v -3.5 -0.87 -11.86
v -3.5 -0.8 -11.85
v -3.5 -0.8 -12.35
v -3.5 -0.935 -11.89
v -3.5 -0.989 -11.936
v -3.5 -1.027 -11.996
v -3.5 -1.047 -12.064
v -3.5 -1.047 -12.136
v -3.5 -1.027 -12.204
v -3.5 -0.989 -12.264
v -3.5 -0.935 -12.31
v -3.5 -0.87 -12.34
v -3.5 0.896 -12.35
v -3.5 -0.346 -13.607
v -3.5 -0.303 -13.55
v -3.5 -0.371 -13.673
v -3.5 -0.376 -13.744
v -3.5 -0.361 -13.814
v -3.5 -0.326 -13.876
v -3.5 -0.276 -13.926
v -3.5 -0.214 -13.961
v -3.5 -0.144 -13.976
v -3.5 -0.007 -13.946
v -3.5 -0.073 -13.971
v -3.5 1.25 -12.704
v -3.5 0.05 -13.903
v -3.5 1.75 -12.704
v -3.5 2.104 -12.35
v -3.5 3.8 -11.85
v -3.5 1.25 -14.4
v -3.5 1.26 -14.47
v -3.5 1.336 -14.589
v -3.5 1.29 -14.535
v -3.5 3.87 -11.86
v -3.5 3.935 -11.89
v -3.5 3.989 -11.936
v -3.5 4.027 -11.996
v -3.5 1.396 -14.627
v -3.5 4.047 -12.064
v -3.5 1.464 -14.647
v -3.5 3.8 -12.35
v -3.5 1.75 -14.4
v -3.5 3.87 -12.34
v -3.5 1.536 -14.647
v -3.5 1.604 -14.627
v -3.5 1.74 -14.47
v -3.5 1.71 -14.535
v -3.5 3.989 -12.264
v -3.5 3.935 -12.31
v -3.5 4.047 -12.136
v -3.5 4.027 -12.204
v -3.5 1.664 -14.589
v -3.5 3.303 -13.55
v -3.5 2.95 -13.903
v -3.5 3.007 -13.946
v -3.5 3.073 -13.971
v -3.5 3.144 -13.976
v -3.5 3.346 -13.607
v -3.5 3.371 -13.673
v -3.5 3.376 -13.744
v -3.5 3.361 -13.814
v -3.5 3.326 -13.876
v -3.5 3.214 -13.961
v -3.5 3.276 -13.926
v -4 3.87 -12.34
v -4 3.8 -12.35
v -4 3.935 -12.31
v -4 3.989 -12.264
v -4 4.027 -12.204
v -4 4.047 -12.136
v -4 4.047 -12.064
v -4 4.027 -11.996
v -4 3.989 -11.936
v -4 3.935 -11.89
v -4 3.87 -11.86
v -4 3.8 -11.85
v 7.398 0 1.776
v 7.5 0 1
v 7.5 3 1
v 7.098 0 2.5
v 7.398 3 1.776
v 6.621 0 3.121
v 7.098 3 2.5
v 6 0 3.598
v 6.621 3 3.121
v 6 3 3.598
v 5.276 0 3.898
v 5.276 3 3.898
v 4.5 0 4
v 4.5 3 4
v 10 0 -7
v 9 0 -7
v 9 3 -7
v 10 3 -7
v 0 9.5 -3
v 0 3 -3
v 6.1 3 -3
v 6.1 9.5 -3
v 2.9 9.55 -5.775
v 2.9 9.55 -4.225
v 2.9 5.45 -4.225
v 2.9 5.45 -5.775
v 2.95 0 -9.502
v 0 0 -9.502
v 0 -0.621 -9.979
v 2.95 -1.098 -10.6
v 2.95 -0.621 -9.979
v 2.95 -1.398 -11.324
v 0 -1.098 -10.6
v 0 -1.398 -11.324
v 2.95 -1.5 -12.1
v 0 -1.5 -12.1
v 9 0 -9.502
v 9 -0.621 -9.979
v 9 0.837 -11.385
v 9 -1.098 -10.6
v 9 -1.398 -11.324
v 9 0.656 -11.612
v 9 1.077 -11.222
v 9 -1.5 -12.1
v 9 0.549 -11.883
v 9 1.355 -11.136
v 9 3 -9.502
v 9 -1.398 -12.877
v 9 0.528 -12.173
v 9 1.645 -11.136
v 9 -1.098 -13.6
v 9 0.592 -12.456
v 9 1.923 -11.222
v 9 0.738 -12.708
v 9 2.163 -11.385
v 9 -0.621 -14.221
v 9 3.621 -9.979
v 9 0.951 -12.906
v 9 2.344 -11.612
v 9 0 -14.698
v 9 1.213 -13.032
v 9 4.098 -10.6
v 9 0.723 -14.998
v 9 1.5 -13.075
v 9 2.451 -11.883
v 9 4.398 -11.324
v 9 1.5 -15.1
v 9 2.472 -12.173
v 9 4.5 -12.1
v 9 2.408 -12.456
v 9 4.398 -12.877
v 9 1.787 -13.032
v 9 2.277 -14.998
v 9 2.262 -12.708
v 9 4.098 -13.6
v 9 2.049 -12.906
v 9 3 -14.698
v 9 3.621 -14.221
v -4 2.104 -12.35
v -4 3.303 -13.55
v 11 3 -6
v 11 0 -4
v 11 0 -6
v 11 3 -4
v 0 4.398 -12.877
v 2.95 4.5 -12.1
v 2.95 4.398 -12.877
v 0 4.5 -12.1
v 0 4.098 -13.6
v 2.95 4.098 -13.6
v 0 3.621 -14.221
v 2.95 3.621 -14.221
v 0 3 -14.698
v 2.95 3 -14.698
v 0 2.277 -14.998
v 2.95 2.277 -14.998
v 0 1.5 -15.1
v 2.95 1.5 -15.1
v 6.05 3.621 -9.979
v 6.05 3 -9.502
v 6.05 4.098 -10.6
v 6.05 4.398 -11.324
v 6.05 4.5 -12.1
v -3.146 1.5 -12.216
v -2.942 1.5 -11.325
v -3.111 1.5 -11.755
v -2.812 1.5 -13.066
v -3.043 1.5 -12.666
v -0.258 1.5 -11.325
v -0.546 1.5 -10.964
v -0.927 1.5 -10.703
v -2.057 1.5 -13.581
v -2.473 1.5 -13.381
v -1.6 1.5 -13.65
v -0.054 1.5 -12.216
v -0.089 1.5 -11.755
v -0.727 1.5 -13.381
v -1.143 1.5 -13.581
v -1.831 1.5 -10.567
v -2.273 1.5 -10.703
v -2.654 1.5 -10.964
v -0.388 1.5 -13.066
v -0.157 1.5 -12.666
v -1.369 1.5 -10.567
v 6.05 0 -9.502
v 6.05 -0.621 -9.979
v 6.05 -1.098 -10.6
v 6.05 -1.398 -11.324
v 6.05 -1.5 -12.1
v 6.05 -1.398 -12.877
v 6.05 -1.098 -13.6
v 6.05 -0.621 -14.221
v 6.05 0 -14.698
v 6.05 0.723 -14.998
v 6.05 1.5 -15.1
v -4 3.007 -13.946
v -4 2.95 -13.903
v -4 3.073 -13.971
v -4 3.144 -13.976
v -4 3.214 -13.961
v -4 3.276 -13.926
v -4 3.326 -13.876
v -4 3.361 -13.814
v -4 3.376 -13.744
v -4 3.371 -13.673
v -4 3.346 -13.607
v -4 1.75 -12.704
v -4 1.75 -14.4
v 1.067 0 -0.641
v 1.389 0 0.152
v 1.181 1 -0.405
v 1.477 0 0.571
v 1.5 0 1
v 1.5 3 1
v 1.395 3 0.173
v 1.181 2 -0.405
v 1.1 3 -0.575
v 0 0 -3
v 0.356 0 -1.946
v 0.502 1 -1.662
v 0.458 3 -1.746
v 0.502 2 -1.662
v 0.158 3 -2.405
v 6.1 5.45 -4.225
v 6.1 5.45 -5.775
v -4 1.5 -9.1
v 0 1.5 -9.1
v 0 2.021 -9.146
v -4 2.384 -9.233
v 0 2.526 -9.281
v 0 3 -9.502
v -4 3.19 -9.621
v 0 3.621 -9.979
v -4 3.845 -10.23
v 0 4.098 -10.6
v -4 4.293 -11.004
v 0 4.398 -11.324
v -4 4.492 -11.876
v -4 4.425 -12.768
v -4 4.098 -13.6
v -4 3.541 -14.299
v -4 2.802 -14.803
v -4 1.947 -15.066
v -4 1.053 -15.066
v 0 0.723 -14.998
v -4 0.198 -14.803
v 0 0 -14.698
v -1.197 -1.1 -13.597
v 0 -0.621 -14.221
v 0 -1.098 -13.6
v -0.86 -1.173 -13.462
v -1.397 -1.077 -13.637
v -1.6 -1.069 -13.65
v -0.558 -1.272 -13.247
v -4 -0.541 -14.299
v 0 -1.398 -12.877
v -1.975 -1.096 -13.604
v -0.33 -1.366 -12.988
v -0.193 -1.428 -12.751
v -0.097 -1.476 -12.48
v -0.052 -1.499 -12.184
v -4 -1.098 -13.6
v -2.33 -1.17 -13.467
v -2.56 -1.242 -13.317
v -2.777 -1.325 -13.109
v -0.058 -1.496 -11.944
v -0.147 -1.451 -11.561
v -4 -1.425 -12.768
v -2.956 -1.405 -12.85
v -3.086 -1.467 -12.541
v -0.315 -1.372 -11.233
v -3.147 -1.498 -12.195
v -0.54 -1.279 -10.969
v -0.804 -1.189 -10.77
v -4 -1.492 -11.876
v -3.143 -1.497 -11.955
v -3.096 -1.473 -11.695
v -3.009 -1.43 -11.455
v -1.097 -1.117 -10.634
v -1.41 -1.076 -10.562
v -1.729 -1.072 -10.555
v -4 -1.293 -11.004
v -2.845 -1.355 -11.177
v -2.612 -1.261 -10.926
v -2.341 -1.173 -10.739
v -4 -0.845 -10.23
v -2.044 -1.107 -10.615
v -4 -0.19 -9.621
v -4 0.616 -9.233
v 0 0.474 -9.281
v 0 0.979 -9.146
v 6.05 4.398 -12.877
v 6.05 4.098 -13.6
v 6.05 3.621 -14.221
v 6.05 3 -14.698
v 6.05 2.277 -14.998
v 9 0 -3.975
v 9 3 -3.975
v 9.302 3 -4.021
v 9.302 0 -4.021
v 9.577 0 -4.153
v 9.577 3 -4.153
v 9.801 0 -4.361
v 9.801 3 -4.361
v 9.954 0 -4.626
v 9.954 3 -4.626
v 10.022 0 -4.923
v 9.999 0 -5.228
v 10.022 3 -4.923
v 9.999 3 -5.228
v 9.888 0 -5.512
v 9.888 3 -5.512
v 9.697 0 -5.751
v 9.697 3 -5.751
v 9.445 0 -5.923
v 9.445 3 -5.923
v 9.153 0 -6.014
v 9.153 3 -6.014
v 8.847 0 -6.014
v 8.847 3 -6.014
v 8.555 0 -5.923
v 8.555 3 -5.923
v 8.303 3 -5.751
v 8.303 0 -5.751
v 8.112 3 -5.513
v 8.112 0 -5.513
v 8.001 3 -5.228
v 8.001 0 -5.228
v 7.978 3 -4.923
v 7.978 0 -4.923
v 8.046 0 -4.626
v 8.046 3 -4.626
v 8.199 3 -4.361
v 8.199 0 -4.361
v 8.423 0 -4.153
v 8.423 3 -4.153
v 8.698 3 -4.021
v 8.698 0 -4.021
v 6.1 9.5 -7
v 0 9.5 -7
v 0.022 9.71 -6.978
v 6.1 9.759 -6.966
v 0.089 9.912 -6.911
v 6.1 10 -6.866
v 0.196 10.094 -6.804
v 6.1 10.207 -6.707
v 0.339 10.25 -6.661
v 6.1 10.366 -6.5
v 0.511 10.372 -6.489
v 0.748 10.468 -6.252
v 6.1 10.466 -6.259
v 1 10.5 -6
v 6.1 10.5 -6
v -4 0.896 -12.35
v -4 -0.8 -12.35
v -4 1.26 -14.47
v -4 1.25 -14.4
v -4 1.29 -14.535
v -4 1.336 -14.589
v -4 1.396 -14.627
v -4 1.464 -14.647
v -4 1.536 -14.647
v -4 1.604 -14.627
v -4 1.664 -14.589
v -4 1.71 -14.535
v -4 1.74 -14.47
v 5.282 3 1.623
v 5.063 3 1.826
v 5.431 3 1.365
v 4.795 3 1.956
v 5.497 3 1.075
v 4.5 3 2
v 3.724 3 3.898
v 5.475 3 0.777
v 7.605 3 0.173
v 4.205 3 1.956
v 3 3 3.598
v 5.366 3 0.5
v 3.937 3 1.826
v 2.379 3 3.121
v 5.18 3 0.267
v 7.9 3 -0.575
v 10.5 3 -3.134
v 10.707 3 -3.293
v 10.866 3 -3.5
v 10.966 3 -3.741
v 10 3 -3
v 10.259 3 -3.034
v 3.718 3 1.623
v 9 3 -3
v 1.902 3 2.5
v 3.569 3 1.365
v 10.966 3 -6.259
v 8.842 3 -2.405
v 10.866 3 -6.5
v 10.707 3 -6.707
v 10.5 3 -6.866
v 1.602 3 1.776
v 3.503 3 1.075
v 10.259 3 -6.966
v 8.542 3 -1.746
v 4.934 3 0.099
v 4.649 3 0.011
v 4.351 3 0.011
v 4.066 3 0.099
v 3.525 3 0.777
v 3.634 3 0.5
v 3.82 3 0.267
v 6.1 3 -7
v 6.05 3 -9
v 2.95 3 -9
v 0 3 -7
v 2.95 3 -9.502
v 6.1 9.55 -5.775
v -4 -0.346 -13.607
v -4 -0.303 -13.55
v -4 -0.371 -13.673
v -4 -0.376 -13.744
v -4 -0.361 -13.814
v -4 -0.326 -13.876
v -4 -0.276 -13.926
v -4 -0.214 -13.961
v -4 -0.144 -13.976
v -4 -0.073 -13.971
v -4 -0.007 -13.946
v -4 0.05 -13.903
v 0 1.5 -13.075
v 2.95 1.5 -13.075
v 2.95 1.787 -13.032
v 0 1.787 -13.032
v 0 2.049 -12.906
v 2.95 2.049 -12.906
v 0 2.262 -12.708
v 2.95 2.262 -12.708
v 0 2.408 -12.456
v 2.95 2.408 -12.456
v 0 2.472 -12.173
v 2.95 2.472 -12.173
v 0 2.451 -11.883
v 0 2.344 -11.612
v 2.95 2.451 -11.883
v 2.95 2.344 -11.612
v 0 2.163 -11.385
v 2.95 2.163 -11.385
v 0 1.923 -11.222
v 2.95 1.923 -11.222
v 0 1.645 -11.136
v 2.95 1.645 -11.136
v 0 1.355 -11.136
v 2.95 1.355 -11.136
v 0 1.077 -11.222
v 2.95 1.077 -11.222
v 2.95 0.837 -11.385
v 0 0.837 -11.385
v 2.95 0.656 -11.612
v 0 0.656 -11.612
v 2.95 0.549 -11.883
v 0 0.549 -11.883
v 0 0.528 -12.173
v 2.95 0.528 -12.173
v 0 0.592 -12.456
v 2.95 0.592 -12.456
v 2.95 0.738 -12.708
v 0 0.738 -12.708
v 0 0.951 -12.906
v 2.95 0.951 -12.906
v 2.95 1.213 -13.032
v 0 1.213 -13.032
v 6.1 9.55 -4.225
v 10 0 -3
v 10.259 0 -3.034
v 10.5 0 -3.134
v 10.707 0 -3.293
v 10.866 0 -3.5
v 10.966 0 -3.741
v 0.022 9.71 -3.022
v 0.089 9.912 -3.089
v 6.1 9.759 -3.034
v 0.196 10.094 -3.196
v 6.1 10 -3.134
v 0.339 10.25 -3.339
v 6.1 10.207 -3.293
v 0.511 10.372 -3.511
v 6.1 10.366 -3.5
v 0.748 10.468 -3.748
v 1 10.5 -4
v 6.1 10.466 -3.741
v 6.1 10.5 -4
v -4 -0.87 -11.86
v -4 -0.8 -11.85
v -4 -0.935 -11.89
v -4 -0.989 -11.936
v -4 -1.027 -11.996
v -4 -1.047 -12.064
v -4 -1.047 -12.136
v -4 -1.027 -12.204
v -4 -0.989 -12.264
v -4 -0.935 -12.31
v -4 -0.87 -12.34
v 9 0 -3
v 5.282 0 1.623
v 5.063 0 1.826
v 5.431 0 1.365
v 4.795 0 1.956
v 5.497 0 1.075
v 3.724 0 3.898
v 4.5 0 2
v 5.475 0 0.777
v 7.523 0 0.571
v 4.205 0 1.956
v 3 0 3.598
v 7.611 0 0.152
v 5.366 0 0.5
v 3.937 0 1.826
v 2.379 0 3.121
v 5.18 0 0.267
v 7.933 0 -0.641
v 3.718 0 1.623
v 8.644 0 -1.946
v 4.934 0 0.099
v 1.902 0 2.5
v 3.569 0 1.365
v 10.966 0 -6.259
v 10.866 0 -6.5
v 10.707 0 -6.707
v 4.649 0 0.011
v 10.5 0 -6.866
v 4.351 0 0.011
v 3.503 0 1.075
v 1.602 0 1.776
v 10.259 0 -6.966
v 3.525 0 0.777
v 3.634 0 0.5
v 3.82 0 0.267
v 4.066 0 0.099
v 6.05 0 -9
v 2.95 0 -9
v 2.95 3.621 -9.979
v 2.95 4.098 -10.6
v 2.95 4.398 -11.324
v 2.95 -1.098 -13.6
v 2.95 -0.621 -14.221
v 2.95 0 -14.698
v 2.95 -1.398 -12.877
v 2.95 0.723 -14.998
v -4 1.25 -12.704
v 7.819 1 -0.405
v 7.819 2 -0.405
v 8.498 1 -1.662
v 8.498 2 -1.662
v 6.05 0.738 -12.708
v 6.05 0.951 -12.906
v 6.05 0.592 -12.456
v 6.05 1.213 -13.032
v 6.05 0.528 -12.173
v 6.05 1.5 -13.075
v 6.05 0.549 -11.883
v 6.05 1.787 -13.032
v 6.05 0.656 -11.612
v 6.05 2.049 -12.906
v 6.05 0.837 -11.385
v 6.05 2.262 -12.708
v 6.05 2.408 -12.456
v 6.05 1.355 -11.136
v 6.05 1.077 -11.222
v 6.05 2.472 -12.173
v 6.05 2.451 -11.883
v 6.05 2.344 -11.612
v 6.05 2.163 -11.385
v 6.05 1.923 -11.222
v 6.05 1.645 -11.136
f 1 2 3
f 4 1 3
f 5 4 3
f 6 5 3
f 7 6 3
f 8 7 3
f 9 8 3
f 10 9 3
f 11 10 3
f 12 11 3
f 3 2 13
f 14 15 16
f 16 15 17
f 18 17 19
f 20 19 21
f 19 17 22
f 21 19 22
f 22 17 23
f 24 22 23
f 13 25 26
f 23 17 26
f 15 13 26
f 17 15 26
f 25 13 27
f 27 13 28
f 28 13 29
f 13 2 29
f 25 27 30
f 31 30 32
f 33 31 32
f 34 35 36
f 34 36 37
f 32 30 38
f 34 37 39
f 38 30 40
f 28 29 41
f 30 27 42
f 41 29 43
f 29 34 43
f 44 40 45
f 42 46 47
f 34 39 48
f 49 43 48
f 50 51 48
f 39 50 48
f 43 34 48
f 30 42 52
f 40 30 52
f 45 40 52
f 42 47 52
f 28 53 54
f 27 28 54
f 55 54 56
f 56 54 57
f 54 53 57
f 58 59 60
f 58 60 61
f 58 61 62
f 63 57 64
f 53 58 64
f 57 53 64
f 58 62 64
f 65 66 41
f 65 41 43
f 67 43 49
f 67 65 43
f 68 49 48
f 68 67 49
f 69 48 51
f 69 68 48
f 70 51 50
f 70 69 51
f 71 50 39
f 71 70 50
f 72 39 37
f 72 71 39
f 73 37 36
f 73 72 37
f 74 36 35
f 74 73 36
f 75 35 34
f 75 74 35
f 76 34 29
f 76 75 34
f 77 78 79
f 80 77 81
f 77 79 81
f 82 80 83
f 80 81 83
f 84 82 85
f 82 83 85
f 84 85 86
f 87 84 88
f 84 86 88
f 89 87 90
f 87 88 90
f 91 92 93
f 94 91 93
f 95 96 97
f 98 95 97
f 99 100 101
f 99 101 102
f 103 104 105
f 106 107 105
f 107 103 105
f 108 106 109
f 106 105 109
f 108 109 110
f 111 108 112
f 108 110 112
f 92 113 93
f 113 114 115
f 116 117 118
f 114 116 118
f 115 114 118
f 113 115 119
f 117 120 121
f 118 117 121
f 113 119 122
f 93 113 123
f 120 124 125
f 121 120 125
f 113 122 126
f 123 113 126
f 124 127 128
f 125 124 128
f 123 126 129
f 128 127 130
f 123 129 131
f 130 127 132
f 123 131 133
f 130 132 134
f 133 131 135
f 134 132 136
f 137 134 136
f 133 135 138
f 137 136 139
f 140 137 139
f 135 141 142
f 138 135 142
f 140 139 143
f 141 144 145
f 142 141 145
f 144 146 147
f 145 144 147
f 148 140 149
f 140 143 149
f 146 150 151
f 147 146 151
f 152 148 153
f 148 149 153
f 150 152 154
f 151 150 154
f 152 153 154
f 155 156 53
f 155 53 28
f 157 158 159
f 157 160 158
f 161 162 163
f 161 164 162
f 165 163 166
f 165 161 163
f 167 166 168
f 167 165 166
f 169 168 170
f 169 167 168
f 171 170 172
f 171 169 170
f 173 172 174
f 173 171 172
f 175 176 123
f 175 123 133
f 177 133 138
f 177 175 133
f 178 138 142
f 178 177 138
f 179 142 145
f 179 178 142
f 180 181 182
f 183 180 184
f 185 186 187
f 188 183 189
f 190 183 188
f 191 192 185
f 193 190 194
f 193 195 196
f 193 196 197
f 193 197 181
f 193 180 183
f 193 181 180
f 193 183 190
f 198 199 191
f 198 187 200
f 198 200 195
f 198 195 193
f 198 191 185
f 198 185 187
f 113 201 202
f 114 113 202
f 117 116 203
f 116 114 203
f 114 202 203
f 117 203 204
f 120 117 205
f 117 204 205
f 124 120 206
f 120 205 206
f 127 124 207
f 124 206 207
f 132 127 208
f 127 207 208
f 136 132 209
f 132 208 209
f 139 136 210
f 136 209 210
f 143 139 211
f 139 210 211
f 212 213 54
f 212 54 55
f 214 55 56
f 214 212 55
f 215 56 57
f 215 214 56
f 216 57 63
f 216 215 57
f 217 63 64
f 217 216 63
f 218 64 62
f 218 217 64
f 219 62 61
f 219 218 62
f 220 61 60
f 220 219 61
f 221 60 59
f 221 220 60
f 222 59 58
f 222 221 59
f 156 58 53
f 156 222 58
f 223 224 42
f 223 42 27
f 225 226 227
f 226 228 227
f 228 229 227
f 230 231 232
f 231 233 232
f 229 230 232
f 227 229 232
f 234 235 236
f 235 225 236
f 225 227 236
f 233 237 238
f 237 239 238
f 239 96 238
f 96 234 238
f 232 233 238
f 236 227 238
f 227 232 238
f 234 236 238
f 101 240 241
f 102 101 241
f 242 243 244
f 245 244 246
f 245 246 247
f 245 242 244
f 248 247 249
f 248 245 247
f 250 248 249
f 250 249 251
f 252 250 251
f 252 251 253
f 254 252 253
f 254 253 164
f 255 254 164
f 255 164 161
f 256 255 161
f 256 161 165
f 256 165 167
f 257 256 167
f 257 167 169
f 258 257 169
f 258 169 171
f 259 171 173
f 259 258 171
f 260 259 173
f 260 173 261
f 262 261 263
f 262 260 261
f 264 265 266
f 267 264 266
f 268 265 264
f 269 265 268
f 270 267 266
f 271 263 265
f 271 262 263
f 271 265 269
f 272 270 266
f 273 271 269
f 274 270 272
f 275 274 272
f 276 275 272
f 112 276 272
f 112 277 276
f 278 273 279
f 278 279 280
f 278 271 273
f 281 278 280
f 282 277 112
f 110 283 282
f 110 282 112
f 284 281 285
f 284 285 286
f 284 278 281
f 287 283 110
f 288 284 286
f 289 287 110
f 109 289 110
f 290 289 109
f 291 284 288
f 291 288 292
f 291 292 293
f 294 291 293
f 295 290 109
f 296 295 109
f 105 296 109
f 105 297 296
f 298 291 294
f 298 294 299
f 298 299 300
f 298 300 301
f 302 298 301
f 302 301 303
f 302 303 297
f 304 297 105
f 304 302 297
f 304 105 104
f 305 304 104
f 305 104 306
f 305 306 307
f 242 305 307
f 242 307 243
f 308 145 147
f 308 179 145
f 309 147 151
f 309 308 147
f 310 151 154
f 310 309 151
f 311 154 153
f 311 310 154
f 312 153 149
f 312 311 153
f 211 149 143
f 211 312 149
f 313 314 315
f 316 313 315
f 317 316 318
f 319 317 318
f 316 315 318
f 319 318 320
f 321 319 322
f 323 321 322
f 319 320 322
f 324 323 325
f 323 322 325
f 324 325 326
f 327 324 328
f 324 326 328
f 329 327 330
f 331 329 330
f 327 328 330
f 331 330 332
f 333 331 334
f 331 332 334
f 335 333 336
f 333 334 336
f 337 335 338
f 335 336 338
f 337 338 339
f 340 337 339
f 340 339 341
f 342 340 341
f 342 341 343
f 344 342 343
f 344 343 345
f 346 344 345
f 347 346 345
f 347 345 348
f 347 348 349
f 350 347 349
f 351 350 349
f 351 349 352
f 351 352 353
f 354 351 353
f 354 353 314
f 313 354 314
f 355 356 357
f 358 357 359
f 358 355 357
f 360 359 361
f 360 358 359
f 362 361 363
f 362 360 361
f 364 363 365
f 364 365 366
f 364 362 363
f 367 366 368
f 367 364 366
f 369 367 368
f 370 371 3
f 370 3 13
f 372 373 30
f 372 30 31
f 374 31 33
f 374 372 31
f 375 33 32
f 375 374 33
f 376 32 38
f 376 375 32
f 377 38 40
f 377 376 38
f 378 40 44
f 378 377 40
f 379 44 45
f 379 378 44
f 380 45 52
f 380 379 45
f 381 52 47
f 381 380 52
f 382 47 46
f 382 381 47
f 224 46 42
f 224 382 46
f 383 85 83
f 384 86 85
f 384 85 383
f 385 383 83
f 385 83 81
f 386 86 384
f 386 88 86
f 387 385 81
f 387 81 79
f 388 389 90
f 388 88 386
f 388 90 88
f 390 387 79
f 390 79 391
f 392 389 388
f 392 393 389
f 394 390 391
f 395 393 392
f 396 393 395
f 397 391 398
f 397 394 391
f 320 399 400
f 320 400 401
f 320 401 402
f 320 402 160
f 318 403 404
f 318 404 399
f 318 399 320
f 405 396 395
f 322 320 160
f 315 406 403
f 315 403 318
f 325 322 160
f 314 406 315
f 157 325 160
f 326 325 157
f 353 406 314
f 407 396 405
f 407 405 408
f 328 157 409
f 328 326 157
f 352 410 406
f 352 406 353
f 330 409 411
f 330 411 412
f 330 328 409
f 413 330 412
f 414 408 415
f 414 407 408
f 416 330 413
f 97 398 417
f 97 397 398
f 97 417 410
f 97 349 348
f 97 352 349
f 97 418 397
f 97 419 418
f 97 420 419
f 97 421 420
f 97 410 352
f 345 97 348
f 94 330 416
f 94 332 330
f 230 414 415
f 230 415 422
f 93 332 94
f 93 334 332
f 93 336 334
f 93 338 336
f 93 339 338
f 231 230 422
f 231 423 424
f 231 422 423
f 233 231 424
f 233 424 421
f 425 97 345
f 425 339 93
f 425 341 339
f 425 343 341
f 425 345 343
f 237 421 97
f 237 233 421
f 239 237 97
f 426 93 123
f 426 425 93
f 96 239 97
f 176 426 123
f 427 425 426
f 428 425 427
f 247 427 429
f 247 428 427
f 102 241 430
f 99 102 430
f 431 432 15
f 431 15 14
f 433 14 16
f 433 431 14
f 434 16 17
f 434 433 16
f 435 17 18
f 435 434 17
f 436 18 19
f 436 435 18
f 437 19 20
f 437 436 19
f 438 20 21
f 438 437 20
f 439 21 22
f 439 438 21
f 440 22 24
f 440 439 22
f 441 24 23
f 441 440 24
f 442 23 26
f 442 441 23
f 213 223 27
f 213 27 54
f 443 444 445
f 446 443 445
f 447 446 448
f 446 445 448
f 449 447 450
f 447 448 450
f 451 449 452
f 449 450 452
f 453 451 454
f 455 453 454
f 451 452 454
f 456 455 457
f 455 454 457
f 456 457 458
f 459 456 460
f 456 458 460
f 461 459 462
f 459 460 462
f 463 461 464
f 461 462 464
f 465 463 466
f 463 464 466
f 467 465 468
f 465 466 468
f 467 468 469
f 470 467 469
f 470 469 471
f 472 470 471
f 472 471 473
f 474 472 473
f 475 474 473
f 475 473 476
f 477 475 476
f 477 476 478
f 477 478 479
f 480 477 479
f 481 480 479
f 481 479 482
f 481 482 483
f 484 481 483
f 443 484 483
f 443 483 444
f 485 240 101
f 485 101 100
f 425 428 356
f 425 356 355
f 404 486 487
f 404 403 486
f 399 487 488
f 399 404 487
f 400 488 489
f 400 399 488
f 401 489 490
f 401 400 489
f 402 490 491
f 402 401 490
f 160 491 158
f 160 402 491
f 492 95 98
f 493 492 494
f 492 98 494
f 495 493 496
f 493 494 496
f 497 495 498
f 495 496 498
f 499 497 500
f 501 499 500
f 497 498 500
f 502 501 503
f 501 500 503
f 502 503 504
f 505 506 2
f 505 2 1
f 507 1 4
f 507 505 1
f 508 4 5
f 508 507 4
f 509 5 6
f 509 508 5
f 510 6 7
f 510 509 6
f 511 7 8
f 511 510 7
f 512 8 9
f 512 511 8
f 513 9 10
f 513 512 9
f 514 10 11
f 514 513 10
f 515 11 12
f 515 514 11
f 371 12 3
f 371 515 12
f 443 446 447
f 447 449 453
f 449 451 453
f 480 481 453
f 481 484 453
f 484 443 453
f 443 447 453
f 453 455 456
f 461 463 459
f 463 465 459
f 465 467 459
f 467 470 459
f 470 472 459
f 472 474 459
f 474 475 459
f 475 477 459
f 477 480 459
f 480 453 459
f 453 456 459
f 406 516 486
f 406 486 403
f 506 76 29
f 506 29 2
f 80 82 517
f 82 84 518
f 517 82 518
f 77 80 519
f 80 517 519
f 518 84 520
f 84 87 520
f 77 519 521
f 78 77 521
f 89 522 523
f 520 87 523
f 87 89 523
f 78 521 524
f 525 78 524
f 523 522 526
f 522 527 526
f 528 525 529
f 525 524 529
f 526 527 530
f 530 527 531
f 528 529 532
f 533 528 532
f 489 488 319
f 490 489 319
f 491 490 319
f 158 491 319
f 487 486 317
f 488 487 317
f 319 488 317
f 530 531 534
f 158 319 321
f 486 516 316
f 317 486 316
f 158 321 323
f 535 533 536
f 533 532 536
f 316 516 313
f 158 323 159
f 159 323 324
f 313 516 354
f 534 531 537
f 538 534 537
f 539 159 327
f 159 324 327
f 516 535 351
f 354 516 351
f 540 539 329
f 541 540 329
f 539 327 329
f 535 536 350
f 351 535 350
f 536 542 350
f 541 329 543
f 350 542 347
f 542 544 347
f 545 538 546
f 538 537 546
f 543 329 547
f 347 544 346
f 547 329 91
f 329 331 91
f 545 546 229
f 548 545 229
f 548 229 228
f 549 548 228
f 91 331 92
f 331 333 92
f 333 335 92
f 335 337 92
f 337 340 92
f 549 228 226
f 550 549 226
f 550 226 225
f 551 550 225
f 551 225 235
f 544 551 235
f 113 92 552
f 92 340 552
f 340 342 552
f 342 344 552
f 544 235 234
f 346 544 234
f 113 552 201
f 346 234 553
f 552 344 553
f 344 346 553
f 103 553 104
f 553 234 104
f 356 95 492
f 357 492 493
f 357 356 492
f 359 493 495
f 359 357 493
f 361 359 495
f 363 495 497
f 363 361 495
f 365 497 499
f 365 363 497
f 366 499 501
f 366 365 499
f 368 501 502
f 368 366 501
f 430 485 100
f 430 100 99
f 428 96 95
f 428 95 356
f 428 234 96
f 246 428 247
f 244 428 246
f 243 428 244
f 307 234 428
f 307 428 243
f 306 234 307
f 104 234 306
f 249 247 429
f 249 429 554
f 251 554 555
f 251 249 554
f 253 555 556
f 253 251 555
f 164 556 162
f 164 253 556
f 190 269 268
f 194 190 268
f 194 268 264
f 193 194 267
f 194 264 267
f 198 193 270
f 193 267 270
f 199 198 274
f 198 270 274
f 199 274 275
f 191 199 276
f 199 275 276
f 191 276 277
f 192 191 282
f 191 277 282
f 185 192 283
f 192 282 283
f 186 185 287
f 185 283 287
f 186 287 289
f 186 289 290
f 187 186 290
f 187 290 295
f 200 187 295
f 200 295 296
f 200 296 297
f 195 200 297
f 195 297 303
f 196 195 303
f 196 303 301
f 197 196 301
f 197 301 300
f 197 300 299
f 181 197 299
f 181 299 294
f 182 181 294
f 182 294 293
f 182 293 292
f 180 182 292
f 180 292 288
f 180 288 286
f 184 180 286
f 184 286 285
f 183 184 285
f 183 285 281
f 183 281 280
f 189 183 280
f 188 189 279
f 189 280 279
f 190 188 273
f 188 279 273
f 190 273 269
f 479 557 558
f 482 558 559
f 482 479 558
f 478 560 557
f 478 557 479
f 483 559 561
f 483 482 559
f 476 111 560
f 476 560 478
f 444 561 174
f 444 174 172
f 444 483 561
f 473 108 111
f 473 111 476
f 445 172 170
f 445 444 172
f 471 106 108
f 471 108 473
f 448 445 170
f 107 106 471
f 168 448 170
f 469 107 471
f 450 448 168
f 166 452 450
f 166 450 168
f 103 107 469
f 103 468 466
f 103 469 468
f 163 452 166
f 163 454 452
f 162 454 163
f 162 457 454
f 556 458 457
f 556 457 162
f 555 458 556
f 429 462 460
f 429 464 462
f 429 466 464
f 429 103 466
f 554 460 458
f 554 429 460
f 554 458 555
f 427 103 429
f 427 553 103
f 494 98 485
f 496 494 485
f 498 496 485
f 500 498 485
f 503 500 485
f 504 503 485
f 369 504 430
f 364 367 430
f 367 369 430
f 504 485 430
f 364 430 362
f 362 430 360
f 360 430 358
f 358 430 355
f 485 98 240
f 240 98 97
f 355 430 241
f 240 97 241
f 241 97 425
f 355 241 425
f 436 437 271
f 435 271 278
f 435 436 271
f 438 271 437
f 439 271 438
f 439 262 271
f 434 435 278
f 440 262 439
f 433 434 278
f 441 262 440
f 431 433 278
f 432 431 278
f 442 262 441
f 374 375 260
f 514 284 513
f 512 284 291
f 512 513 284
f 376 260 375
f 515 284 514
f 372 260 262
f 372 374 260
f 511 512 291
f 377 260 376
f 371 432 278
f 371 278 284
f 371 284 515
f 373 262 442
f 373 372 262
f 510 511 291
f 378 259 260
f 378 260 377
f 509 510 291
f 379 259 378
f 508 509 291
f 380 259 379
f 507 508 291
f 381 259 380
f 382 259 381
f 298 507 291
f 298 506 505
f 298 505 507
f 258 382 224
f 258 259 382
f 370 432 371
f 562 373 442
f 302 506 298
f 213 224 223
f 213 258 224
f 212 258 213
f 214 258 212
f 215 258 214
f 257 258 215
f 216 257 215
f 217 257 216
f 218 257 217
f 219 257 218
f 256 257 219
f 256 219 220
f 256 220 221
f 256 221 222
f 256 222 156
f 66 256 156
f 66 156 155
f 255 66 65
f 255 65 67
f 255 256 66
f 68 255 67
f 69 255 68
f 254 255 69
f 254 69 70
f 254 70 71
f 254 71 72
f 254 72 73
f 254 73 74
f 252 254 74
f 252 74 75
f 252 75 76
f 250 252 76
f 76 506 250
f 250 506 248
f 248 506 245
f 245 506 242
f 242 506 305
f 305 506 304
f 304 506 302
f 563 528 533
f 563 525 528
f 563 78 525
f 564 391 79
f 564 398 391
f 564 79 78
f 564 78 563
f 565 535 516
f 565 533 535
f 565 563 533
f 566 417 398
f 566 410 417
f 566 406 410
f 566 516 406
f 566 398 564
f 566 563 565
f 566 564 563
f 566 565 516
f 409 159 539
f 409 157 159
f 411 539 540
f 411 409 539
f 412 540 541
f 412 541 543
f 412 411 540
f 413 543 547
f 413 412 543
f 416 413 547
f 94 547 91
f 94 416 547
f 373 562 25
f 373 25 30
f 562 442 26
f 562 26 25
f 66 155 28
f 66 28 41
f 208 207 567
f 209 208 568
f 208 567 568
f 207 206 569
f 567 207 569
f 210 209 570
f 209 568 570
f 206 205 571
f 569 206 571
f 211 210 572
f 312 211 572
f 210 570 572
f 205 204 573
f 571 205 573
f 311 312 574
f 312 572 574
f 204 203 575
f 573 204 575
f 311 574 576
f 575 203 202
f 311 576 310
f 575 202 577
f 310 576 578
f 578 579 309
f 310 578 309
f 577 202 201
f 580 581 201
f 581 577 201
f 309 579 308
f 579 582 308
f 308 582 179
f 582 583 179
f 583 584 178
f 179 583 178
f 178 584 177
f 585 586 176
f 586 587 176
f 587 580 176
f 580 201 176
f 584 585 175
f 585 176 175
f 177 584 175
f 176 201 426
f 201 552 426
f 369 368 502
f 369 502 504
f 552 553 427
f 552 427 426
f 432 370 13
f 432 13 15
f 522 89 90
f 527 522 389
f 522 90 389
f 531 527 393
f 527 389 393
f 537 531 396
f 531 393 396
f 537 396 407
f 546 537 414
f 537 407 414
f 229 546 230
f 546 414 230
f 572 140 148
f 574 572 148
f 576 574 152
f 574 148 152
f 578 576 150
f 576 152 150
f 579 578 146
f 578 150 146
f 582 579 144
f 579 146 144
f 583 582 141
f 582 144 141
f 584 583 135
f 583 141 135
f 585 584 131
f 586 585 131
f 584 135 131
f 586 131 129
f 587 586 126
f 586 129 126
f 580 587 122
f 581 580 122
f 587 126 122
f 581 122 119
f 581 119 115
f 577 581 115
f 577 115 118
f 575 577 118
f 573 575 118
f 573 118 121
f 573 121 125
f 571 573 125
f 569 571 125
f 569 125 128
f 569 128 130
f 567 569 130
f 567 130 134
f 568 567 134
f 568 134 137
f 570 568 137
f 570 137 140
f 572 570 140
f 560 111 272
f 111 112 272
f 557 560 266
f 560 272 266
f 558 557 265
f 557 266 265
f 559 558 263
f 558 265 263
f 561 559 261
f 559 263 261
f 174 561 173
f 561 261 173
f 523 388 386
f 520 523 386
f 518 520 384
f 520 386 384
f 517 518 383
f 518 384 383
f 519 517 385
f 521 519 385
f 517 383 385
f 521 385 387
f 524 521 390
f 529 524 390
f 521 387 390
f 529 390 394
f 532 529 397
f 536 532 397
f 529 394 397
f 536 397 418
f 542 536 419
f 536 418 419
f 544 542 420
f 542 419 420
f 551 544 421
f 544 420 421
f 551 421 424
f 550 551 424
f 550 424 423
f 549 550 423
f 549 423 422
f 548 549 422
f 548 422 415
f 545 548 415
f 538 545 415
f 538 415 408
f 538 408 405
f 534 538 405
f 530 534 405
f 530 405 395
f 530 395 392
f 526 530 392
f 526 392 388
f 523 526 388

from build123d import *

# Parameters (mm, degrees)
SKETCH1_W           = 9
SKETCH1_H           = 9
BOSS_EXTRUDE1_DEPTH = 3
SKETCH2_W           = 2.95
SKETCH2_H           = 6
BOSS_EXTRUDE2_DEPTH = 6.1
FILLET1_R           = 3
SKETCH3_R           = 0.975
CUT_EXTRUDE1_DEPTH  = 11.1
CUT_EXTRUDE3_DEPTH  = 21.1
BOSS_EXTRUDE3_START = 4
SKETCH5_R           = 3
BOSS_EXTRUDE3_DEPTH = 4
SKETCH8_R           = 1.55
CUT_EXTRUDE4_DEPTH  = 3
CUT_EXTRUDE5_DEPTH  = 0.5
SKETCH10_W          = 9
SKETCH10_H          = 3
BOSS_EXTRUDE4_DEPTH = 4
SKETCH11_R          = 1
CUT_EXTRUDE6_DEPTH  = 4
CUT_EXTRUDE7_DEPTH  = 4
SKETCH13_W          = 6.1
SKETCH13_H          = 4
BOSS_EXTRUDE7_DEPTH = 7.5
SKETCH16_W          = 1.55
SKETCH16_H          = 4.1
CUT_EXTRUDE9_DEPTH  = 3.2
SKETCH17_W          = 4
SKETCH17_H          = 3
BOSS_EXTRUDE8_DEPTH = 2
SKETCH19_R          = 1.025
CUT_EXTRUDE10_DEPTH = 4
FILLET2_R           = 1


with BuildPart() as part:
    # Sketch1 → Boss-Extrude1 (new body)
    with BuildSketch(Plane(origin=(0, 0, 0), x_dir=(1, 0, 0), z_dir=(0, 1, 0))):
        with Locations((4.5, 4.5)):
            Rectangle(SKETCH1_W, SKETCH1_H)
    extrude(amount=BOSS_EXTRUDE1_DEPTH)

    # Sketch2 → Boss-Extrude2 (add)
    with BuildSketch(Plane(origin=(0, 0, -9), x_dir=(-1, 0, 0), z_dir=(0, 0, -1))):
        with Locations((-7.525, 1.5)):
            Rectangle(SKETCH2_W, SKETCH2_H)
        with Locations((-1.475, 1.5)):
            Rectangle(SKETCH2_W, SKETCH2_H)
    extrude(amount=BOSS_EXTRUDE2_DEPTH)

    # Fillet1
    fillet1_edges = [part.edges().sort_by_distance(p)[0] for p in [
        (1.475, 4.5, -15.1),
        (1.475, -1.5, -15.1),
        (7.525, -1.5, -15.1),
        (7.525, 4.5, -15.1),
    ]]
    fillet(fillet1_edges, radius=FILLET1_R - 0.0001)  # a hair under: the kernel refuses the full size

    # Sketch3 → Cut-Extrude1 (cut)
    with BuildSketch(Plane(origin=(9, 0, 0), x_dir=(0, 0, -1), z_dir=(1, 0, 0))):
        with Locations((12.1, 1.5)):
            Circle(SKETCH3_R)
    extrude(amount=-CUT_EXTRUDE1_DEPTH, mode=Mode.SUBTRACT)

    # Sketch6 → Cut-Extrude3 (cut)
    with BuildSketch(Plane.ZY):
        with BuildLine():
            Line((-12.1, 4.5), (-9, 4.5))
            Line((-9, 4.5), (-9, 3))
            Line((-9, 3), (-9.501923789, 3))
            ThreePointArc((-9.501923789, 3), (-10.6, 4.098076211), (-12.1, 4.5))
        make_face()
        with BuildLine():
            Line((-12.1, -1.5), (-9, -1.5))
            Line((-9, -1.5), (-9, 0))
            Line((-9, 0), (-9.501923789, 0))
            ThreePointArc((-9.501923789, 0), (-10.6, -1.098076211), (-12.1, -1.5))
        make_face()
    extrude(amount=-CUT_EXTRUDE3_DEPTH, mode=Mode.SUBTRACT)

    # Sketch5 → Boss-Extrude3 (add)
    with BuildSketch(Plane.ZY.offset(BOSS_EXTRUDE3_START)):
        with Locations((-12.1, 1.5)):
            Circle(SKETCH5_R)
    extrude(amount=-BOSS_EXTRUDE3_DEPTH)

    # Sketch8 → Cut-Extrude4 (cut)
    with BuildSketch(Plane(origin=(0, -1.5, 0), x_dir=(-1, 0, 0), z_dir=(0, -1, 0))):
        with Locations(Location((1.6, 12.1, 0), (0, 0, 90))):
            Circle(SKETCH8_R)
    extrude(amount=-CUT_EXTRUDE4_DEPTH, mode=Mode.SUBTRACT)

    # Sketch9 → Cut-Extrude5 (cut)
    with BuildSketch(Plane.ZY.offset(4)):
        with BuildLine():
            Line((-11.85, 1.5), (-11.85, -0.8))
            ThreePointArc((-11.85, -0.8), (-12.1, -1.05), (-12.35, -0.8))
            Line((-12.35, -0.8), (-12.35, 0.896446609))
            Line((-12.35, 0.896446609), (-13.549568901, -0.303122292))
            ThreePointArc((-13.549568901, -0.303122292), (-13.903122292, -0.303122292), (-13.903122292, 0.050431099))
            Line((-13.903122292, 0.050431099), (-12.703553391, 1.25))
            Line((-12.703553391, 1.25), (-14.4, 1.25))
            ThreePointArc((-14.4, 1.25), (-14.65, 1.5), (-14.4, 1.75))
            Line((-14.4, 1.75), (-12.703553391, 1.75))
            Line((-12.703553391, 1.75), (-13.903122292, 2.949568901))
            ThreePointArc((-13.903122292, 2.949568901), (-13.903122292, 3.303122292), (-13.549568901, 3.303122292))
            Line((-13.549568901, 3.303122292), (-12.35, 2.103553391))
            Line((-12.35, 2.103553391), (-12.35, 3.8))
            ThreePointArc((-12.35, 3.8), (-12.1, 4.05), (-11.85, 3.8))
            Line((-11.85, 3.8), (-11.85, 1.5))
        make_face()
    extrude(amount=-CUT_EXTRUDE5_DEPTH, mode=Mode.SUBTRACT)

    # Sketch10 → Boss-Extrude4 (add)
    with BuildSketch(Plane.XY):
        with Locations((4.5, 1.5)):
            Rectangle(SKETCH10_W, SKETCH10_H)
    extrude(amount=BOSS_EXTRUDE4_DEPTH)

    # Sketch11 → Cut-Extrude6 (cut)
    with BuildSketch(Plane(origin=(0, 3, 0), x_dir=(1, 0, 0), z_dir=(0, 1, 0))):
        with Locations(Location((4.5, -1, 0), (0, 0, 270))):
            Circle(SKETCH11_R)
    extrude(amount=-CUT_EXTRUDE6_DEPTH, mode=Mode.SUBTRACT)

    # Sketch12 → Cut-Extrude7 (cut)
    with BuildSketch(Plane(origin=(0, 3, 0), x_dir=(1, 0, 0), z_dir=(0, 1, 0))):
        with BuildLine():
            add(Edge.make_bspline(
                [(1.5, -1), (1.53988428, 0.555027292), (0.235256098, 1.545486909), (0, 3)],
                knots=[0, 0, 0, 0, 1, 1, 1, 1], degree=3))
            Line((0, 3), (0, -4))
            Line((0, -4), (4.5, -4))
            ThreePointArc((4.5, -4), (2.378679656, -3.121320344), (1.5, -1))
        make_face()
        with BuildLine():
            ThreePointArc((7.5, -1), (6.621320344, -3.121320344), (4.5, -4))
            Line((4.5, -4), (9, -4))
            Line((9, -4), (9, 3))
            add(Edge.make_bspline(
                [(7.5, -1), (7.46011572, 0.555027292), (8.764743902, 1.545486909), (9, 3)],
                knots=[0, 0, 0, 0, 1, 1, 1, 1], degree=3))
        make_face()
    extrude(amount=-CUT_EXTRUDE7_DEPTH, mode=Mode.SUBTRACT)

    # Sketch13 → Boss-Extrude7 (add)
    with BuildSketch(Plane(origin=(0, 3, 0), x_dir=(1, 0, 0), z_dir=(0, 1, 0))):
        with Locations((3.05, 5)):
            Rectangle(SKETCH13_W, SKETCH13_H)
    extrude(amount=BOSS_EXTRUDE7_DEPTH)

    # Sketch16 → Cut-Extrude9 (cut)
    with BuildSketch(Plane(origin=(6.1, 0, 0), x_dir=(0, 0, -1), z_dir=(1, 0, 0))):
        with Locations((5, 7.5)):
            Rectangle(SKETCH16_W, SKETCH16_H)
    extrude(amount=-CUT_EXTRUDE9_DEPTH, mode=Mode.SUBTRACT)

    # Sketch17 → Boss-Extrude8 (add)
    with BuildSketch(Plane(origin=(9, 0, 0), x_dir=(0, 0, -1), z_dir=(1, 0, 0))):
        with Locations((5, 1.5)):
            Rectangle(SKETCH17_W, SKETCH17_H)
    extrude(amount=BOSS_EXTRUDE8_DEPTH)

    # Sketch19 → Cut-Extrude10 (cut)
    with BuildSketch(Plane(origin=(0, 3, 0), x_dir=(1, 0, 0), z_dir=(0, 1, 0))):
        with Locations(Location((9, 5, 0), (0, 0, 270))):
            Circle(SKETCH19_R)
    extrude(amount=-CUT_EXTRUDE10_DEPTH, mode=Mode.SUBTRACT)

    # Fillet2
    fillet2_edges = [part.edges().sort_by_distance(p)[0] for p in [
        (0, 10.5, -5),
        (3.05, 10.5, -3),
        (3.05, 10.5, -7),
        (11, 1.5, -3),
        (11, 1.5, -7),
    ]]
    fillet(fillet2_edges, radius=FILLET2_R)


solid = part.part
